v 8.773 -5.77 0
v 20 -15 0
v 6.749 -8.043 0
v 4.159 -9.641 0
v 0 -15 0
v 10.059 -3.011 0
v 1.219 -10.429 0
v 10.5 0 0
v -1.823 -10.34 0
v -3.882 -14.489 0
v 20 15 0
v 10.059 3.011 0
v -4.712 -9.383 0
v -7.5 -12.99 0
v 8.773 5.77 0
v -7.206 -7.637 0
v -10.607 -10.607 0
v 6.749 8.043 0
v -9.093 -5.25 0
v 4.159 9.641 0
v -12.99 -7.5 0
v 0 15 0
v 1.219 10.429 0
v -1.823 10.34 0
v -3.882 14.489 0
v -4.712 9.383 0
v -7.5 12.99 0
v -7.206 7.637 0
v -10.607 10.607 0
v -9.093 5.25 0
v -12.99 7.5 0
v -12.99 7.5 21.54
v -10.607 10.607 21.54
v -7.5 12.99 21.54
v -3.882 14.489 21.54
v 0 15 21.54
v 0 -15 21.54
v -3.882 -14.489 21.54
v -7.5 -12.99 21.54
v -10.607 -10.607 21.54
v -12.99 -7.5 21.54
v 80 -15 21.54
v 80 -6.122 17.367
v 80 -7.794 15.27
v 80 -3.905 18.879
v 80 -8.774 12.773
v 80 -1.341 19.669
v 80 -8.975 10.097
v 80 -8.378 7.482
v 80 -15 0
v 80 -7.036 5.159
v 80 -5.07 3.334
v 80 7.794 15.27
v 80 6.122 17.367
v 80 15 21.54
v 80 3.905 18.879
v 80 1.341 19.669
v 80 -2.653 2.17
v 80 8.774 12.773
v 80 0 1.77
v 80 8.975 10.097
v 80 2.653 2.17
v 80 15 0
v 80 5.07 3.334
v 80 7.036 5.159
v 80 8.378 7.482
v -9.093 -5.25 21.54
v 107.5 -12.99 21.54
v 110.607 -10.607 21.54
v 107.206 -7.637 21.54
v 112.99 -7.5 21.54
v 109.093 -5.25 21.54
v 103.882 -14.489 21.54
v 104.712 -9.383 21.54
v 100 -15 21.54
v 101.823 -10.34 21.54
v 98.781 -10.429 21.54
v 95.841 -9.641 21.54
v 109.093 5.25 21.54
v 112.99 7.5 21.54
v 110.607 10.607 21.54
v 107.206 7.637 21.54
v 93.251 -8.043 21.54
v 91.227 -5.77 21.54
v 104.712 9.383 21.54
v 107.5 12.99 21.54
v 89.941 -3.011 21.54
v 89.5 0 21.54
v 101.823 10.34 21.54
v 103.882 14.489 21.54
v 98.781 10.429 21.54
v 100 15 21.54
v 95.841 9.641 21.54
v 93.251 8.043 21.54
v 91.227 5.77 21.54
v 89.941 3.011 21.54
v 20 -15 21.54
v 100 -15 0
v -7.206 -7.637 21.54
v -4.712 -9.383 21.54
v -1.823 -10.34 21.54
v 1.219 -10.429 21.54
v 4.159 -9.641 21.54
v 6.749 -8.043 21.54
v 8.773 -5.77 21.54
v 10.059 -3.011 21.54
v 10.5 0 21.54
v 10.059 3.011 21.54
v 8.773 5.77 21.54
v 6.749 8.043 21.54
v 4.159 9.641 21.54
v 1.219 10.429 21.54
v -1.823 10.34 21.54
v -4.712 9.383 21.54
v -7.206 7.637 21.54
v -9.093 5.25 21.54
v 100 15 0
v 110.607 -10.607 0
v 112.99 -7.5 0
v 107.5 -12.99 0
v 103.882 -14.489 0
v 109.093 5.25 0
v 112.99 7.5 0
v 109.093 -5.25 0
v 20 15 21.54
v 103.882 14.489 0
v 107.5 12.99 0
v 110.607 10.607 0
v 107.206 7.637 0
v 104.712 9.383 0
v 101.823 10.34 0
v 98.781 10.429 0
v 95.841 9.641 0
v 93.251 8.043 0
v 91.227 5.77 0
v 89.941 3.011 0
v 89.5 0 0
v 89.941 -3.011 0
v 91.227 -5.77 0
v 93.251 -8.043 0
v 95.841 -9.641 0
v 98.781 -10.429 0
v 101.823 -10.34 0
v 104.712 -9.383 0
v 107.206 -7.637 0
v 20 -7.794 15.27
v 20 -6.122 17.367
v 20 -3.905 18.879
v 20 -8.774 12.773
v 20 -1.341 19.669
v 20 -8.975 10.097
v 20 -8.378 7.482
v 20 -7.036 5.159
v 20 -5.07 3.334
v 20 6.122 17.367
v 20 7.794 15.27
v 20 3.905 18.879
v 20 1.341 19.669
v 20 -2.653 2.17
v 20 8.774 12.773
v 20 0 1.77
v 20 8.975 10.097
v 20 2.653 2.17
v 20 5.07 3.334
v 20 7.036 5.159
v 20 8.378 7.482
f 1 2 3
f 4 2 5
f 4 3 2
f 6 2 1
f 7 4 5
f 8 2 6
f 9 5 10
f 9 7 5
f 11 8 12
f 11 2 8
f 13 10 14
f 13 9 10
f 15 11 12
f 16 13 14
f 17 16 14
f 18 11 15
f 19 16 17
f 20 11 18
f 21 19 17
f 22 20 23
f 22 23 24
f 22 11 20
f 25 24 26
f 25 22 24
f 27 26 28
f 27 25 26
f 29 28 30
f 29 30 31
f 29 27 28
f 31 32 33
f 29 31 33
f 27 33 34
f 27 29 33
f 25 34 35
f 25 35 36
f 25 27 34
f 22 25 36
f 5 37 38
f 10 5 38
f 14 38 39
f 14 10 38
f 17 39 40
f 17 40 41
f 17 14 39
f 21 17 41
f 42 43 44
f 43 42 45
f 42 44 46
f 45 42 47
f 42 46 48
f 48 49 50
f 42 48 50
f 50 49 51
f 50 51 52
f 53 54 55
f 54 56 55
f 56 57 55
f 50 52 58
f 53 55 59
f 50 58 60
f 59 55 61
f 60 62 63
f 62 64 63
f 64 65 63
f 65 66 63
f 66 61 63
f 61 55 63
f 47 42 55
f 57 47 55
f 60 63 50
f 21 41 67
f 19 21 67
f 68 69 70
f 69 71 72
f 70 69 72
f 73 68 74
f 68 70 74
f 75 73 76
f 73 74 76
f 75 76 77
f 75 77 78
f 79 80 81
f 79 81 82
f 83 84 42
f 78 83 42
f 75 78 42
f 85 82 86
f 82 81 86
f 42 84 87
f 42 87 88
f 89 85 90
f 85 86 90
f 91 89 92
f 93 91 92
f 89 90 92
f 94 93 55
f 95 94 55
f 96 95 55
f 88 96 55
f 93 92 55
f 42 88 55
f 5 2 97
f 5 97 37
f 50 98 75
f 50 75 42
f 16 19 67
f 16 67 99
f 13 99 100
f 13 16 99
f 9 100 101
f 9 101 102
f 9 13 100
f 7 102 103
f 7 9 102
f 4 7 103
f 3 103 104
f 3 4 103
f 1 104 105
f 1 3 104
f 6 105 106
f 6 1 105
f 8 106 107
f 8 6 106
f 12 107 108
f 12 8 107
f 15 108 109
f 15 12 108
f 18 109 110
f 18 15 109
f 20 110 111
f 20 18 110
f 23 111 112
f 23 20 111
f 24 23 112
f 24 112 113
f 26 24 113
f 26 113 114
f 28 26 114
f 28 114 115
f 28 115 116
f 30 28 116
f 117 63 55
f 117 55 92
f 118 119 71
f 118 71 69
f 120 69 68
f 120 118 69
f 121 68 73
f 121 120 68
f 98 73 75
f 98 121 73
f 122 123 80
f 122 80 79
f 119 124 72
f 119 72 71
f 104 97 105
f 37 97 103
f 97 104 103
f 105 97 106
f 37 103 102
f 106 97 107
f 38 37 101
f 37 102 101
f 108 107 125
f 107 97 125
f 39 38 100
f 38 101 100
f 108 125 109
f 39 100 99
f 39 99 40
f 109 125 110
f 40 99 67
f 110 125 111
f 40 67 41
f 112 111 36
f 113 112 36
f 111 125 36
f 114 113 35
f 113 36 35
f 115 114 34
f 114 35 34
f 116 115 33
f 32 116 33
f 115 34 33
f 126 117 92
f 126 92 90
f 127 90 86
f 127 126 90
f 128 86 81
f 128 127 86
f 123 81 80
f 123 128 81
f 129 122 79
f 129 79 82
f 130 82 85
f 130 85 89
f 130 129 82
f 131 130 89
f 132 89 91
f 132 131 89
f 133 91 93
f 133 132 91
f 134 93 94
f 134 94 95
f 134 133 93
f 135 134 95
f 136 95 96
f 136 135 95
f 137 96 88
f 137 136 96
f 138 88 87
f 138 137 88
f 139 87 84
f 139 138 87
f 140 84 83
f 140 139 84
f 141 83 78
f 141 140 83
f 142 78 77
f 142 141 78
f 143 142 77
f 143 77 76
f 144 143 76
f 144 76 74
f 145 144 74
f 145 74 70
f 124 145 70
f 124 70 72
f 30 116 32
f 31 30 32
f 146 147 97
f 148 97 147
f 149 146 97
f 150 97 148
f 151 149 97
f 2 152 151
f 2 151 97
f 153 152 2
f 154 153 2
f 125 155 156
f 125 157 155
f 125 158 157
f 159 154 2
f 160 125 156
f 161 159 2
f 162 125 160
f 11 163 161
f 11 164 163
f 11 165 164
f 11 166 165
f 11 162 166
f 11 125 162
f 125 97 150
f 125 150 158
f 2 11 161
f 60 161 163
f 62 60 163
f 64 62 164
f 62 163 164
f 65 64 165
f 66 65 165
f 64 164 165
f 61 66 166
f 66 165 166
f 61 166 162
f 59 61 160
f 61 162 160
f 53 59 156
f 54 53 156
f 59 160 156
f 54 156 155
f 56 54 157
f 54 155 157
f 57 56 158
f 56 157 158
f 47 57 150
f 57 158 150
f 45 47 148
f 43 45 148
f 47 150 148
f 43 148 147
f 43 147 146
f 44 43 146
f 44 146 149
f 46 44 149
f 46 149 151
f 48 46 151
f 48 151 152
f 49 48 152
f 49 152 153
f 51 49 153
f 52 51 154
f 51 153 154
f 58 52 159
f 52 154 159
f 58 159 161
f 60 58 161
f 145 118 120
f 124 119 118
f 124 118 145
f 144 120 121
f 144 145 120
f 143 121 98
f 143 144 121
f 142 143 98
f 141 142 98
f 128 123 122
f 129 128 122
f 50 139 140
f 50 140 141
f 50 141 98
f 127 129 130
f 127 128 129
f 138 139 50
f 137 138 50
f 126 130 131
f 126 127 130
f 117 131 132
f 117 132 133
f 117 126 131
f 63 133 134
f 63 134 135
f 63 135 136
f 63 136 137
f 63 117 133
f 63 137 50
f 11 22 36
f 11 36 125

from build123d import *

# Parameters (mm, degrees)
ESTRUSIONE_ESTRUSIONE1_DEPTH = 21.54
SCHIZZO2_W                   = 21.54
SCHIZZO2_H                   = 30
SCHIZZO2_R                   = 9
TAGLIO_ESTRUSIONE1_DEPTH     = 60


with BuildPart() as part:
    # Schizzo1 → Estrusione-Estrusione1 (new body)
    with BuildSketch(Plane.XY):
        with BuildLine():
            Line((0, 15), (100, 15))
            ThreePointArc((100, 15), (107.5, 12.990381057), (112.990381057, 7.5))
            Line((112.990381057, 7.5), (109.09326674, 5.25))
            ThreePointArc((109.09326674, 5.25), (89.5, 0), (109.09326674, -5.25))
            Line((109.09326674, -5.25), (112.990381057, -7.5))
            ThreePointArc((112.990381057, -7.5), (107.5, -12.990381057), (100, -15))
            Line((100, -15), (0, -15))
            ThreePointArc((0, -15), (-7.5, -12.990381057), (-12.990381057, -7.5))
            Line((-12.990381057, -7.5), (-9.09326674, -5.25))
            ThreePointArc((-9.09326674, -5.25), (10.5, 0), (-9.09326674, 5.25))
            Line((-9.09326674, 5.25), (-12.990381057, 7.5))
            ThreePointArc((-12.990381057, 7.5), (-7.5, 12.990381057), (0, 15))
        make_face()
    extrude(amount=ESTRUSIONE_ESTRUSIONE1_DEPTH)

    # Schizzo2 → Taglio-Estrusione1 (cut)
    with BuildSketch(Plane(origin=(20, 0, 0), x_dir=(0, 0, -1), z_dir=(1, 0, 0))):
        with Locations((-10.77, 0)):
            Rectangle(SCHIZZO2_W, SCHIZZO2_H)
        with Locations((-10.77, 0)):
            Circle(SCHIZZO2_R, mode=Mode.SUBTRACT)
    extrude(amount=TAGLIO_ESTRUSIONE1_DEPTH, mode=Mode.SUBTRACT)


solid = part.part
